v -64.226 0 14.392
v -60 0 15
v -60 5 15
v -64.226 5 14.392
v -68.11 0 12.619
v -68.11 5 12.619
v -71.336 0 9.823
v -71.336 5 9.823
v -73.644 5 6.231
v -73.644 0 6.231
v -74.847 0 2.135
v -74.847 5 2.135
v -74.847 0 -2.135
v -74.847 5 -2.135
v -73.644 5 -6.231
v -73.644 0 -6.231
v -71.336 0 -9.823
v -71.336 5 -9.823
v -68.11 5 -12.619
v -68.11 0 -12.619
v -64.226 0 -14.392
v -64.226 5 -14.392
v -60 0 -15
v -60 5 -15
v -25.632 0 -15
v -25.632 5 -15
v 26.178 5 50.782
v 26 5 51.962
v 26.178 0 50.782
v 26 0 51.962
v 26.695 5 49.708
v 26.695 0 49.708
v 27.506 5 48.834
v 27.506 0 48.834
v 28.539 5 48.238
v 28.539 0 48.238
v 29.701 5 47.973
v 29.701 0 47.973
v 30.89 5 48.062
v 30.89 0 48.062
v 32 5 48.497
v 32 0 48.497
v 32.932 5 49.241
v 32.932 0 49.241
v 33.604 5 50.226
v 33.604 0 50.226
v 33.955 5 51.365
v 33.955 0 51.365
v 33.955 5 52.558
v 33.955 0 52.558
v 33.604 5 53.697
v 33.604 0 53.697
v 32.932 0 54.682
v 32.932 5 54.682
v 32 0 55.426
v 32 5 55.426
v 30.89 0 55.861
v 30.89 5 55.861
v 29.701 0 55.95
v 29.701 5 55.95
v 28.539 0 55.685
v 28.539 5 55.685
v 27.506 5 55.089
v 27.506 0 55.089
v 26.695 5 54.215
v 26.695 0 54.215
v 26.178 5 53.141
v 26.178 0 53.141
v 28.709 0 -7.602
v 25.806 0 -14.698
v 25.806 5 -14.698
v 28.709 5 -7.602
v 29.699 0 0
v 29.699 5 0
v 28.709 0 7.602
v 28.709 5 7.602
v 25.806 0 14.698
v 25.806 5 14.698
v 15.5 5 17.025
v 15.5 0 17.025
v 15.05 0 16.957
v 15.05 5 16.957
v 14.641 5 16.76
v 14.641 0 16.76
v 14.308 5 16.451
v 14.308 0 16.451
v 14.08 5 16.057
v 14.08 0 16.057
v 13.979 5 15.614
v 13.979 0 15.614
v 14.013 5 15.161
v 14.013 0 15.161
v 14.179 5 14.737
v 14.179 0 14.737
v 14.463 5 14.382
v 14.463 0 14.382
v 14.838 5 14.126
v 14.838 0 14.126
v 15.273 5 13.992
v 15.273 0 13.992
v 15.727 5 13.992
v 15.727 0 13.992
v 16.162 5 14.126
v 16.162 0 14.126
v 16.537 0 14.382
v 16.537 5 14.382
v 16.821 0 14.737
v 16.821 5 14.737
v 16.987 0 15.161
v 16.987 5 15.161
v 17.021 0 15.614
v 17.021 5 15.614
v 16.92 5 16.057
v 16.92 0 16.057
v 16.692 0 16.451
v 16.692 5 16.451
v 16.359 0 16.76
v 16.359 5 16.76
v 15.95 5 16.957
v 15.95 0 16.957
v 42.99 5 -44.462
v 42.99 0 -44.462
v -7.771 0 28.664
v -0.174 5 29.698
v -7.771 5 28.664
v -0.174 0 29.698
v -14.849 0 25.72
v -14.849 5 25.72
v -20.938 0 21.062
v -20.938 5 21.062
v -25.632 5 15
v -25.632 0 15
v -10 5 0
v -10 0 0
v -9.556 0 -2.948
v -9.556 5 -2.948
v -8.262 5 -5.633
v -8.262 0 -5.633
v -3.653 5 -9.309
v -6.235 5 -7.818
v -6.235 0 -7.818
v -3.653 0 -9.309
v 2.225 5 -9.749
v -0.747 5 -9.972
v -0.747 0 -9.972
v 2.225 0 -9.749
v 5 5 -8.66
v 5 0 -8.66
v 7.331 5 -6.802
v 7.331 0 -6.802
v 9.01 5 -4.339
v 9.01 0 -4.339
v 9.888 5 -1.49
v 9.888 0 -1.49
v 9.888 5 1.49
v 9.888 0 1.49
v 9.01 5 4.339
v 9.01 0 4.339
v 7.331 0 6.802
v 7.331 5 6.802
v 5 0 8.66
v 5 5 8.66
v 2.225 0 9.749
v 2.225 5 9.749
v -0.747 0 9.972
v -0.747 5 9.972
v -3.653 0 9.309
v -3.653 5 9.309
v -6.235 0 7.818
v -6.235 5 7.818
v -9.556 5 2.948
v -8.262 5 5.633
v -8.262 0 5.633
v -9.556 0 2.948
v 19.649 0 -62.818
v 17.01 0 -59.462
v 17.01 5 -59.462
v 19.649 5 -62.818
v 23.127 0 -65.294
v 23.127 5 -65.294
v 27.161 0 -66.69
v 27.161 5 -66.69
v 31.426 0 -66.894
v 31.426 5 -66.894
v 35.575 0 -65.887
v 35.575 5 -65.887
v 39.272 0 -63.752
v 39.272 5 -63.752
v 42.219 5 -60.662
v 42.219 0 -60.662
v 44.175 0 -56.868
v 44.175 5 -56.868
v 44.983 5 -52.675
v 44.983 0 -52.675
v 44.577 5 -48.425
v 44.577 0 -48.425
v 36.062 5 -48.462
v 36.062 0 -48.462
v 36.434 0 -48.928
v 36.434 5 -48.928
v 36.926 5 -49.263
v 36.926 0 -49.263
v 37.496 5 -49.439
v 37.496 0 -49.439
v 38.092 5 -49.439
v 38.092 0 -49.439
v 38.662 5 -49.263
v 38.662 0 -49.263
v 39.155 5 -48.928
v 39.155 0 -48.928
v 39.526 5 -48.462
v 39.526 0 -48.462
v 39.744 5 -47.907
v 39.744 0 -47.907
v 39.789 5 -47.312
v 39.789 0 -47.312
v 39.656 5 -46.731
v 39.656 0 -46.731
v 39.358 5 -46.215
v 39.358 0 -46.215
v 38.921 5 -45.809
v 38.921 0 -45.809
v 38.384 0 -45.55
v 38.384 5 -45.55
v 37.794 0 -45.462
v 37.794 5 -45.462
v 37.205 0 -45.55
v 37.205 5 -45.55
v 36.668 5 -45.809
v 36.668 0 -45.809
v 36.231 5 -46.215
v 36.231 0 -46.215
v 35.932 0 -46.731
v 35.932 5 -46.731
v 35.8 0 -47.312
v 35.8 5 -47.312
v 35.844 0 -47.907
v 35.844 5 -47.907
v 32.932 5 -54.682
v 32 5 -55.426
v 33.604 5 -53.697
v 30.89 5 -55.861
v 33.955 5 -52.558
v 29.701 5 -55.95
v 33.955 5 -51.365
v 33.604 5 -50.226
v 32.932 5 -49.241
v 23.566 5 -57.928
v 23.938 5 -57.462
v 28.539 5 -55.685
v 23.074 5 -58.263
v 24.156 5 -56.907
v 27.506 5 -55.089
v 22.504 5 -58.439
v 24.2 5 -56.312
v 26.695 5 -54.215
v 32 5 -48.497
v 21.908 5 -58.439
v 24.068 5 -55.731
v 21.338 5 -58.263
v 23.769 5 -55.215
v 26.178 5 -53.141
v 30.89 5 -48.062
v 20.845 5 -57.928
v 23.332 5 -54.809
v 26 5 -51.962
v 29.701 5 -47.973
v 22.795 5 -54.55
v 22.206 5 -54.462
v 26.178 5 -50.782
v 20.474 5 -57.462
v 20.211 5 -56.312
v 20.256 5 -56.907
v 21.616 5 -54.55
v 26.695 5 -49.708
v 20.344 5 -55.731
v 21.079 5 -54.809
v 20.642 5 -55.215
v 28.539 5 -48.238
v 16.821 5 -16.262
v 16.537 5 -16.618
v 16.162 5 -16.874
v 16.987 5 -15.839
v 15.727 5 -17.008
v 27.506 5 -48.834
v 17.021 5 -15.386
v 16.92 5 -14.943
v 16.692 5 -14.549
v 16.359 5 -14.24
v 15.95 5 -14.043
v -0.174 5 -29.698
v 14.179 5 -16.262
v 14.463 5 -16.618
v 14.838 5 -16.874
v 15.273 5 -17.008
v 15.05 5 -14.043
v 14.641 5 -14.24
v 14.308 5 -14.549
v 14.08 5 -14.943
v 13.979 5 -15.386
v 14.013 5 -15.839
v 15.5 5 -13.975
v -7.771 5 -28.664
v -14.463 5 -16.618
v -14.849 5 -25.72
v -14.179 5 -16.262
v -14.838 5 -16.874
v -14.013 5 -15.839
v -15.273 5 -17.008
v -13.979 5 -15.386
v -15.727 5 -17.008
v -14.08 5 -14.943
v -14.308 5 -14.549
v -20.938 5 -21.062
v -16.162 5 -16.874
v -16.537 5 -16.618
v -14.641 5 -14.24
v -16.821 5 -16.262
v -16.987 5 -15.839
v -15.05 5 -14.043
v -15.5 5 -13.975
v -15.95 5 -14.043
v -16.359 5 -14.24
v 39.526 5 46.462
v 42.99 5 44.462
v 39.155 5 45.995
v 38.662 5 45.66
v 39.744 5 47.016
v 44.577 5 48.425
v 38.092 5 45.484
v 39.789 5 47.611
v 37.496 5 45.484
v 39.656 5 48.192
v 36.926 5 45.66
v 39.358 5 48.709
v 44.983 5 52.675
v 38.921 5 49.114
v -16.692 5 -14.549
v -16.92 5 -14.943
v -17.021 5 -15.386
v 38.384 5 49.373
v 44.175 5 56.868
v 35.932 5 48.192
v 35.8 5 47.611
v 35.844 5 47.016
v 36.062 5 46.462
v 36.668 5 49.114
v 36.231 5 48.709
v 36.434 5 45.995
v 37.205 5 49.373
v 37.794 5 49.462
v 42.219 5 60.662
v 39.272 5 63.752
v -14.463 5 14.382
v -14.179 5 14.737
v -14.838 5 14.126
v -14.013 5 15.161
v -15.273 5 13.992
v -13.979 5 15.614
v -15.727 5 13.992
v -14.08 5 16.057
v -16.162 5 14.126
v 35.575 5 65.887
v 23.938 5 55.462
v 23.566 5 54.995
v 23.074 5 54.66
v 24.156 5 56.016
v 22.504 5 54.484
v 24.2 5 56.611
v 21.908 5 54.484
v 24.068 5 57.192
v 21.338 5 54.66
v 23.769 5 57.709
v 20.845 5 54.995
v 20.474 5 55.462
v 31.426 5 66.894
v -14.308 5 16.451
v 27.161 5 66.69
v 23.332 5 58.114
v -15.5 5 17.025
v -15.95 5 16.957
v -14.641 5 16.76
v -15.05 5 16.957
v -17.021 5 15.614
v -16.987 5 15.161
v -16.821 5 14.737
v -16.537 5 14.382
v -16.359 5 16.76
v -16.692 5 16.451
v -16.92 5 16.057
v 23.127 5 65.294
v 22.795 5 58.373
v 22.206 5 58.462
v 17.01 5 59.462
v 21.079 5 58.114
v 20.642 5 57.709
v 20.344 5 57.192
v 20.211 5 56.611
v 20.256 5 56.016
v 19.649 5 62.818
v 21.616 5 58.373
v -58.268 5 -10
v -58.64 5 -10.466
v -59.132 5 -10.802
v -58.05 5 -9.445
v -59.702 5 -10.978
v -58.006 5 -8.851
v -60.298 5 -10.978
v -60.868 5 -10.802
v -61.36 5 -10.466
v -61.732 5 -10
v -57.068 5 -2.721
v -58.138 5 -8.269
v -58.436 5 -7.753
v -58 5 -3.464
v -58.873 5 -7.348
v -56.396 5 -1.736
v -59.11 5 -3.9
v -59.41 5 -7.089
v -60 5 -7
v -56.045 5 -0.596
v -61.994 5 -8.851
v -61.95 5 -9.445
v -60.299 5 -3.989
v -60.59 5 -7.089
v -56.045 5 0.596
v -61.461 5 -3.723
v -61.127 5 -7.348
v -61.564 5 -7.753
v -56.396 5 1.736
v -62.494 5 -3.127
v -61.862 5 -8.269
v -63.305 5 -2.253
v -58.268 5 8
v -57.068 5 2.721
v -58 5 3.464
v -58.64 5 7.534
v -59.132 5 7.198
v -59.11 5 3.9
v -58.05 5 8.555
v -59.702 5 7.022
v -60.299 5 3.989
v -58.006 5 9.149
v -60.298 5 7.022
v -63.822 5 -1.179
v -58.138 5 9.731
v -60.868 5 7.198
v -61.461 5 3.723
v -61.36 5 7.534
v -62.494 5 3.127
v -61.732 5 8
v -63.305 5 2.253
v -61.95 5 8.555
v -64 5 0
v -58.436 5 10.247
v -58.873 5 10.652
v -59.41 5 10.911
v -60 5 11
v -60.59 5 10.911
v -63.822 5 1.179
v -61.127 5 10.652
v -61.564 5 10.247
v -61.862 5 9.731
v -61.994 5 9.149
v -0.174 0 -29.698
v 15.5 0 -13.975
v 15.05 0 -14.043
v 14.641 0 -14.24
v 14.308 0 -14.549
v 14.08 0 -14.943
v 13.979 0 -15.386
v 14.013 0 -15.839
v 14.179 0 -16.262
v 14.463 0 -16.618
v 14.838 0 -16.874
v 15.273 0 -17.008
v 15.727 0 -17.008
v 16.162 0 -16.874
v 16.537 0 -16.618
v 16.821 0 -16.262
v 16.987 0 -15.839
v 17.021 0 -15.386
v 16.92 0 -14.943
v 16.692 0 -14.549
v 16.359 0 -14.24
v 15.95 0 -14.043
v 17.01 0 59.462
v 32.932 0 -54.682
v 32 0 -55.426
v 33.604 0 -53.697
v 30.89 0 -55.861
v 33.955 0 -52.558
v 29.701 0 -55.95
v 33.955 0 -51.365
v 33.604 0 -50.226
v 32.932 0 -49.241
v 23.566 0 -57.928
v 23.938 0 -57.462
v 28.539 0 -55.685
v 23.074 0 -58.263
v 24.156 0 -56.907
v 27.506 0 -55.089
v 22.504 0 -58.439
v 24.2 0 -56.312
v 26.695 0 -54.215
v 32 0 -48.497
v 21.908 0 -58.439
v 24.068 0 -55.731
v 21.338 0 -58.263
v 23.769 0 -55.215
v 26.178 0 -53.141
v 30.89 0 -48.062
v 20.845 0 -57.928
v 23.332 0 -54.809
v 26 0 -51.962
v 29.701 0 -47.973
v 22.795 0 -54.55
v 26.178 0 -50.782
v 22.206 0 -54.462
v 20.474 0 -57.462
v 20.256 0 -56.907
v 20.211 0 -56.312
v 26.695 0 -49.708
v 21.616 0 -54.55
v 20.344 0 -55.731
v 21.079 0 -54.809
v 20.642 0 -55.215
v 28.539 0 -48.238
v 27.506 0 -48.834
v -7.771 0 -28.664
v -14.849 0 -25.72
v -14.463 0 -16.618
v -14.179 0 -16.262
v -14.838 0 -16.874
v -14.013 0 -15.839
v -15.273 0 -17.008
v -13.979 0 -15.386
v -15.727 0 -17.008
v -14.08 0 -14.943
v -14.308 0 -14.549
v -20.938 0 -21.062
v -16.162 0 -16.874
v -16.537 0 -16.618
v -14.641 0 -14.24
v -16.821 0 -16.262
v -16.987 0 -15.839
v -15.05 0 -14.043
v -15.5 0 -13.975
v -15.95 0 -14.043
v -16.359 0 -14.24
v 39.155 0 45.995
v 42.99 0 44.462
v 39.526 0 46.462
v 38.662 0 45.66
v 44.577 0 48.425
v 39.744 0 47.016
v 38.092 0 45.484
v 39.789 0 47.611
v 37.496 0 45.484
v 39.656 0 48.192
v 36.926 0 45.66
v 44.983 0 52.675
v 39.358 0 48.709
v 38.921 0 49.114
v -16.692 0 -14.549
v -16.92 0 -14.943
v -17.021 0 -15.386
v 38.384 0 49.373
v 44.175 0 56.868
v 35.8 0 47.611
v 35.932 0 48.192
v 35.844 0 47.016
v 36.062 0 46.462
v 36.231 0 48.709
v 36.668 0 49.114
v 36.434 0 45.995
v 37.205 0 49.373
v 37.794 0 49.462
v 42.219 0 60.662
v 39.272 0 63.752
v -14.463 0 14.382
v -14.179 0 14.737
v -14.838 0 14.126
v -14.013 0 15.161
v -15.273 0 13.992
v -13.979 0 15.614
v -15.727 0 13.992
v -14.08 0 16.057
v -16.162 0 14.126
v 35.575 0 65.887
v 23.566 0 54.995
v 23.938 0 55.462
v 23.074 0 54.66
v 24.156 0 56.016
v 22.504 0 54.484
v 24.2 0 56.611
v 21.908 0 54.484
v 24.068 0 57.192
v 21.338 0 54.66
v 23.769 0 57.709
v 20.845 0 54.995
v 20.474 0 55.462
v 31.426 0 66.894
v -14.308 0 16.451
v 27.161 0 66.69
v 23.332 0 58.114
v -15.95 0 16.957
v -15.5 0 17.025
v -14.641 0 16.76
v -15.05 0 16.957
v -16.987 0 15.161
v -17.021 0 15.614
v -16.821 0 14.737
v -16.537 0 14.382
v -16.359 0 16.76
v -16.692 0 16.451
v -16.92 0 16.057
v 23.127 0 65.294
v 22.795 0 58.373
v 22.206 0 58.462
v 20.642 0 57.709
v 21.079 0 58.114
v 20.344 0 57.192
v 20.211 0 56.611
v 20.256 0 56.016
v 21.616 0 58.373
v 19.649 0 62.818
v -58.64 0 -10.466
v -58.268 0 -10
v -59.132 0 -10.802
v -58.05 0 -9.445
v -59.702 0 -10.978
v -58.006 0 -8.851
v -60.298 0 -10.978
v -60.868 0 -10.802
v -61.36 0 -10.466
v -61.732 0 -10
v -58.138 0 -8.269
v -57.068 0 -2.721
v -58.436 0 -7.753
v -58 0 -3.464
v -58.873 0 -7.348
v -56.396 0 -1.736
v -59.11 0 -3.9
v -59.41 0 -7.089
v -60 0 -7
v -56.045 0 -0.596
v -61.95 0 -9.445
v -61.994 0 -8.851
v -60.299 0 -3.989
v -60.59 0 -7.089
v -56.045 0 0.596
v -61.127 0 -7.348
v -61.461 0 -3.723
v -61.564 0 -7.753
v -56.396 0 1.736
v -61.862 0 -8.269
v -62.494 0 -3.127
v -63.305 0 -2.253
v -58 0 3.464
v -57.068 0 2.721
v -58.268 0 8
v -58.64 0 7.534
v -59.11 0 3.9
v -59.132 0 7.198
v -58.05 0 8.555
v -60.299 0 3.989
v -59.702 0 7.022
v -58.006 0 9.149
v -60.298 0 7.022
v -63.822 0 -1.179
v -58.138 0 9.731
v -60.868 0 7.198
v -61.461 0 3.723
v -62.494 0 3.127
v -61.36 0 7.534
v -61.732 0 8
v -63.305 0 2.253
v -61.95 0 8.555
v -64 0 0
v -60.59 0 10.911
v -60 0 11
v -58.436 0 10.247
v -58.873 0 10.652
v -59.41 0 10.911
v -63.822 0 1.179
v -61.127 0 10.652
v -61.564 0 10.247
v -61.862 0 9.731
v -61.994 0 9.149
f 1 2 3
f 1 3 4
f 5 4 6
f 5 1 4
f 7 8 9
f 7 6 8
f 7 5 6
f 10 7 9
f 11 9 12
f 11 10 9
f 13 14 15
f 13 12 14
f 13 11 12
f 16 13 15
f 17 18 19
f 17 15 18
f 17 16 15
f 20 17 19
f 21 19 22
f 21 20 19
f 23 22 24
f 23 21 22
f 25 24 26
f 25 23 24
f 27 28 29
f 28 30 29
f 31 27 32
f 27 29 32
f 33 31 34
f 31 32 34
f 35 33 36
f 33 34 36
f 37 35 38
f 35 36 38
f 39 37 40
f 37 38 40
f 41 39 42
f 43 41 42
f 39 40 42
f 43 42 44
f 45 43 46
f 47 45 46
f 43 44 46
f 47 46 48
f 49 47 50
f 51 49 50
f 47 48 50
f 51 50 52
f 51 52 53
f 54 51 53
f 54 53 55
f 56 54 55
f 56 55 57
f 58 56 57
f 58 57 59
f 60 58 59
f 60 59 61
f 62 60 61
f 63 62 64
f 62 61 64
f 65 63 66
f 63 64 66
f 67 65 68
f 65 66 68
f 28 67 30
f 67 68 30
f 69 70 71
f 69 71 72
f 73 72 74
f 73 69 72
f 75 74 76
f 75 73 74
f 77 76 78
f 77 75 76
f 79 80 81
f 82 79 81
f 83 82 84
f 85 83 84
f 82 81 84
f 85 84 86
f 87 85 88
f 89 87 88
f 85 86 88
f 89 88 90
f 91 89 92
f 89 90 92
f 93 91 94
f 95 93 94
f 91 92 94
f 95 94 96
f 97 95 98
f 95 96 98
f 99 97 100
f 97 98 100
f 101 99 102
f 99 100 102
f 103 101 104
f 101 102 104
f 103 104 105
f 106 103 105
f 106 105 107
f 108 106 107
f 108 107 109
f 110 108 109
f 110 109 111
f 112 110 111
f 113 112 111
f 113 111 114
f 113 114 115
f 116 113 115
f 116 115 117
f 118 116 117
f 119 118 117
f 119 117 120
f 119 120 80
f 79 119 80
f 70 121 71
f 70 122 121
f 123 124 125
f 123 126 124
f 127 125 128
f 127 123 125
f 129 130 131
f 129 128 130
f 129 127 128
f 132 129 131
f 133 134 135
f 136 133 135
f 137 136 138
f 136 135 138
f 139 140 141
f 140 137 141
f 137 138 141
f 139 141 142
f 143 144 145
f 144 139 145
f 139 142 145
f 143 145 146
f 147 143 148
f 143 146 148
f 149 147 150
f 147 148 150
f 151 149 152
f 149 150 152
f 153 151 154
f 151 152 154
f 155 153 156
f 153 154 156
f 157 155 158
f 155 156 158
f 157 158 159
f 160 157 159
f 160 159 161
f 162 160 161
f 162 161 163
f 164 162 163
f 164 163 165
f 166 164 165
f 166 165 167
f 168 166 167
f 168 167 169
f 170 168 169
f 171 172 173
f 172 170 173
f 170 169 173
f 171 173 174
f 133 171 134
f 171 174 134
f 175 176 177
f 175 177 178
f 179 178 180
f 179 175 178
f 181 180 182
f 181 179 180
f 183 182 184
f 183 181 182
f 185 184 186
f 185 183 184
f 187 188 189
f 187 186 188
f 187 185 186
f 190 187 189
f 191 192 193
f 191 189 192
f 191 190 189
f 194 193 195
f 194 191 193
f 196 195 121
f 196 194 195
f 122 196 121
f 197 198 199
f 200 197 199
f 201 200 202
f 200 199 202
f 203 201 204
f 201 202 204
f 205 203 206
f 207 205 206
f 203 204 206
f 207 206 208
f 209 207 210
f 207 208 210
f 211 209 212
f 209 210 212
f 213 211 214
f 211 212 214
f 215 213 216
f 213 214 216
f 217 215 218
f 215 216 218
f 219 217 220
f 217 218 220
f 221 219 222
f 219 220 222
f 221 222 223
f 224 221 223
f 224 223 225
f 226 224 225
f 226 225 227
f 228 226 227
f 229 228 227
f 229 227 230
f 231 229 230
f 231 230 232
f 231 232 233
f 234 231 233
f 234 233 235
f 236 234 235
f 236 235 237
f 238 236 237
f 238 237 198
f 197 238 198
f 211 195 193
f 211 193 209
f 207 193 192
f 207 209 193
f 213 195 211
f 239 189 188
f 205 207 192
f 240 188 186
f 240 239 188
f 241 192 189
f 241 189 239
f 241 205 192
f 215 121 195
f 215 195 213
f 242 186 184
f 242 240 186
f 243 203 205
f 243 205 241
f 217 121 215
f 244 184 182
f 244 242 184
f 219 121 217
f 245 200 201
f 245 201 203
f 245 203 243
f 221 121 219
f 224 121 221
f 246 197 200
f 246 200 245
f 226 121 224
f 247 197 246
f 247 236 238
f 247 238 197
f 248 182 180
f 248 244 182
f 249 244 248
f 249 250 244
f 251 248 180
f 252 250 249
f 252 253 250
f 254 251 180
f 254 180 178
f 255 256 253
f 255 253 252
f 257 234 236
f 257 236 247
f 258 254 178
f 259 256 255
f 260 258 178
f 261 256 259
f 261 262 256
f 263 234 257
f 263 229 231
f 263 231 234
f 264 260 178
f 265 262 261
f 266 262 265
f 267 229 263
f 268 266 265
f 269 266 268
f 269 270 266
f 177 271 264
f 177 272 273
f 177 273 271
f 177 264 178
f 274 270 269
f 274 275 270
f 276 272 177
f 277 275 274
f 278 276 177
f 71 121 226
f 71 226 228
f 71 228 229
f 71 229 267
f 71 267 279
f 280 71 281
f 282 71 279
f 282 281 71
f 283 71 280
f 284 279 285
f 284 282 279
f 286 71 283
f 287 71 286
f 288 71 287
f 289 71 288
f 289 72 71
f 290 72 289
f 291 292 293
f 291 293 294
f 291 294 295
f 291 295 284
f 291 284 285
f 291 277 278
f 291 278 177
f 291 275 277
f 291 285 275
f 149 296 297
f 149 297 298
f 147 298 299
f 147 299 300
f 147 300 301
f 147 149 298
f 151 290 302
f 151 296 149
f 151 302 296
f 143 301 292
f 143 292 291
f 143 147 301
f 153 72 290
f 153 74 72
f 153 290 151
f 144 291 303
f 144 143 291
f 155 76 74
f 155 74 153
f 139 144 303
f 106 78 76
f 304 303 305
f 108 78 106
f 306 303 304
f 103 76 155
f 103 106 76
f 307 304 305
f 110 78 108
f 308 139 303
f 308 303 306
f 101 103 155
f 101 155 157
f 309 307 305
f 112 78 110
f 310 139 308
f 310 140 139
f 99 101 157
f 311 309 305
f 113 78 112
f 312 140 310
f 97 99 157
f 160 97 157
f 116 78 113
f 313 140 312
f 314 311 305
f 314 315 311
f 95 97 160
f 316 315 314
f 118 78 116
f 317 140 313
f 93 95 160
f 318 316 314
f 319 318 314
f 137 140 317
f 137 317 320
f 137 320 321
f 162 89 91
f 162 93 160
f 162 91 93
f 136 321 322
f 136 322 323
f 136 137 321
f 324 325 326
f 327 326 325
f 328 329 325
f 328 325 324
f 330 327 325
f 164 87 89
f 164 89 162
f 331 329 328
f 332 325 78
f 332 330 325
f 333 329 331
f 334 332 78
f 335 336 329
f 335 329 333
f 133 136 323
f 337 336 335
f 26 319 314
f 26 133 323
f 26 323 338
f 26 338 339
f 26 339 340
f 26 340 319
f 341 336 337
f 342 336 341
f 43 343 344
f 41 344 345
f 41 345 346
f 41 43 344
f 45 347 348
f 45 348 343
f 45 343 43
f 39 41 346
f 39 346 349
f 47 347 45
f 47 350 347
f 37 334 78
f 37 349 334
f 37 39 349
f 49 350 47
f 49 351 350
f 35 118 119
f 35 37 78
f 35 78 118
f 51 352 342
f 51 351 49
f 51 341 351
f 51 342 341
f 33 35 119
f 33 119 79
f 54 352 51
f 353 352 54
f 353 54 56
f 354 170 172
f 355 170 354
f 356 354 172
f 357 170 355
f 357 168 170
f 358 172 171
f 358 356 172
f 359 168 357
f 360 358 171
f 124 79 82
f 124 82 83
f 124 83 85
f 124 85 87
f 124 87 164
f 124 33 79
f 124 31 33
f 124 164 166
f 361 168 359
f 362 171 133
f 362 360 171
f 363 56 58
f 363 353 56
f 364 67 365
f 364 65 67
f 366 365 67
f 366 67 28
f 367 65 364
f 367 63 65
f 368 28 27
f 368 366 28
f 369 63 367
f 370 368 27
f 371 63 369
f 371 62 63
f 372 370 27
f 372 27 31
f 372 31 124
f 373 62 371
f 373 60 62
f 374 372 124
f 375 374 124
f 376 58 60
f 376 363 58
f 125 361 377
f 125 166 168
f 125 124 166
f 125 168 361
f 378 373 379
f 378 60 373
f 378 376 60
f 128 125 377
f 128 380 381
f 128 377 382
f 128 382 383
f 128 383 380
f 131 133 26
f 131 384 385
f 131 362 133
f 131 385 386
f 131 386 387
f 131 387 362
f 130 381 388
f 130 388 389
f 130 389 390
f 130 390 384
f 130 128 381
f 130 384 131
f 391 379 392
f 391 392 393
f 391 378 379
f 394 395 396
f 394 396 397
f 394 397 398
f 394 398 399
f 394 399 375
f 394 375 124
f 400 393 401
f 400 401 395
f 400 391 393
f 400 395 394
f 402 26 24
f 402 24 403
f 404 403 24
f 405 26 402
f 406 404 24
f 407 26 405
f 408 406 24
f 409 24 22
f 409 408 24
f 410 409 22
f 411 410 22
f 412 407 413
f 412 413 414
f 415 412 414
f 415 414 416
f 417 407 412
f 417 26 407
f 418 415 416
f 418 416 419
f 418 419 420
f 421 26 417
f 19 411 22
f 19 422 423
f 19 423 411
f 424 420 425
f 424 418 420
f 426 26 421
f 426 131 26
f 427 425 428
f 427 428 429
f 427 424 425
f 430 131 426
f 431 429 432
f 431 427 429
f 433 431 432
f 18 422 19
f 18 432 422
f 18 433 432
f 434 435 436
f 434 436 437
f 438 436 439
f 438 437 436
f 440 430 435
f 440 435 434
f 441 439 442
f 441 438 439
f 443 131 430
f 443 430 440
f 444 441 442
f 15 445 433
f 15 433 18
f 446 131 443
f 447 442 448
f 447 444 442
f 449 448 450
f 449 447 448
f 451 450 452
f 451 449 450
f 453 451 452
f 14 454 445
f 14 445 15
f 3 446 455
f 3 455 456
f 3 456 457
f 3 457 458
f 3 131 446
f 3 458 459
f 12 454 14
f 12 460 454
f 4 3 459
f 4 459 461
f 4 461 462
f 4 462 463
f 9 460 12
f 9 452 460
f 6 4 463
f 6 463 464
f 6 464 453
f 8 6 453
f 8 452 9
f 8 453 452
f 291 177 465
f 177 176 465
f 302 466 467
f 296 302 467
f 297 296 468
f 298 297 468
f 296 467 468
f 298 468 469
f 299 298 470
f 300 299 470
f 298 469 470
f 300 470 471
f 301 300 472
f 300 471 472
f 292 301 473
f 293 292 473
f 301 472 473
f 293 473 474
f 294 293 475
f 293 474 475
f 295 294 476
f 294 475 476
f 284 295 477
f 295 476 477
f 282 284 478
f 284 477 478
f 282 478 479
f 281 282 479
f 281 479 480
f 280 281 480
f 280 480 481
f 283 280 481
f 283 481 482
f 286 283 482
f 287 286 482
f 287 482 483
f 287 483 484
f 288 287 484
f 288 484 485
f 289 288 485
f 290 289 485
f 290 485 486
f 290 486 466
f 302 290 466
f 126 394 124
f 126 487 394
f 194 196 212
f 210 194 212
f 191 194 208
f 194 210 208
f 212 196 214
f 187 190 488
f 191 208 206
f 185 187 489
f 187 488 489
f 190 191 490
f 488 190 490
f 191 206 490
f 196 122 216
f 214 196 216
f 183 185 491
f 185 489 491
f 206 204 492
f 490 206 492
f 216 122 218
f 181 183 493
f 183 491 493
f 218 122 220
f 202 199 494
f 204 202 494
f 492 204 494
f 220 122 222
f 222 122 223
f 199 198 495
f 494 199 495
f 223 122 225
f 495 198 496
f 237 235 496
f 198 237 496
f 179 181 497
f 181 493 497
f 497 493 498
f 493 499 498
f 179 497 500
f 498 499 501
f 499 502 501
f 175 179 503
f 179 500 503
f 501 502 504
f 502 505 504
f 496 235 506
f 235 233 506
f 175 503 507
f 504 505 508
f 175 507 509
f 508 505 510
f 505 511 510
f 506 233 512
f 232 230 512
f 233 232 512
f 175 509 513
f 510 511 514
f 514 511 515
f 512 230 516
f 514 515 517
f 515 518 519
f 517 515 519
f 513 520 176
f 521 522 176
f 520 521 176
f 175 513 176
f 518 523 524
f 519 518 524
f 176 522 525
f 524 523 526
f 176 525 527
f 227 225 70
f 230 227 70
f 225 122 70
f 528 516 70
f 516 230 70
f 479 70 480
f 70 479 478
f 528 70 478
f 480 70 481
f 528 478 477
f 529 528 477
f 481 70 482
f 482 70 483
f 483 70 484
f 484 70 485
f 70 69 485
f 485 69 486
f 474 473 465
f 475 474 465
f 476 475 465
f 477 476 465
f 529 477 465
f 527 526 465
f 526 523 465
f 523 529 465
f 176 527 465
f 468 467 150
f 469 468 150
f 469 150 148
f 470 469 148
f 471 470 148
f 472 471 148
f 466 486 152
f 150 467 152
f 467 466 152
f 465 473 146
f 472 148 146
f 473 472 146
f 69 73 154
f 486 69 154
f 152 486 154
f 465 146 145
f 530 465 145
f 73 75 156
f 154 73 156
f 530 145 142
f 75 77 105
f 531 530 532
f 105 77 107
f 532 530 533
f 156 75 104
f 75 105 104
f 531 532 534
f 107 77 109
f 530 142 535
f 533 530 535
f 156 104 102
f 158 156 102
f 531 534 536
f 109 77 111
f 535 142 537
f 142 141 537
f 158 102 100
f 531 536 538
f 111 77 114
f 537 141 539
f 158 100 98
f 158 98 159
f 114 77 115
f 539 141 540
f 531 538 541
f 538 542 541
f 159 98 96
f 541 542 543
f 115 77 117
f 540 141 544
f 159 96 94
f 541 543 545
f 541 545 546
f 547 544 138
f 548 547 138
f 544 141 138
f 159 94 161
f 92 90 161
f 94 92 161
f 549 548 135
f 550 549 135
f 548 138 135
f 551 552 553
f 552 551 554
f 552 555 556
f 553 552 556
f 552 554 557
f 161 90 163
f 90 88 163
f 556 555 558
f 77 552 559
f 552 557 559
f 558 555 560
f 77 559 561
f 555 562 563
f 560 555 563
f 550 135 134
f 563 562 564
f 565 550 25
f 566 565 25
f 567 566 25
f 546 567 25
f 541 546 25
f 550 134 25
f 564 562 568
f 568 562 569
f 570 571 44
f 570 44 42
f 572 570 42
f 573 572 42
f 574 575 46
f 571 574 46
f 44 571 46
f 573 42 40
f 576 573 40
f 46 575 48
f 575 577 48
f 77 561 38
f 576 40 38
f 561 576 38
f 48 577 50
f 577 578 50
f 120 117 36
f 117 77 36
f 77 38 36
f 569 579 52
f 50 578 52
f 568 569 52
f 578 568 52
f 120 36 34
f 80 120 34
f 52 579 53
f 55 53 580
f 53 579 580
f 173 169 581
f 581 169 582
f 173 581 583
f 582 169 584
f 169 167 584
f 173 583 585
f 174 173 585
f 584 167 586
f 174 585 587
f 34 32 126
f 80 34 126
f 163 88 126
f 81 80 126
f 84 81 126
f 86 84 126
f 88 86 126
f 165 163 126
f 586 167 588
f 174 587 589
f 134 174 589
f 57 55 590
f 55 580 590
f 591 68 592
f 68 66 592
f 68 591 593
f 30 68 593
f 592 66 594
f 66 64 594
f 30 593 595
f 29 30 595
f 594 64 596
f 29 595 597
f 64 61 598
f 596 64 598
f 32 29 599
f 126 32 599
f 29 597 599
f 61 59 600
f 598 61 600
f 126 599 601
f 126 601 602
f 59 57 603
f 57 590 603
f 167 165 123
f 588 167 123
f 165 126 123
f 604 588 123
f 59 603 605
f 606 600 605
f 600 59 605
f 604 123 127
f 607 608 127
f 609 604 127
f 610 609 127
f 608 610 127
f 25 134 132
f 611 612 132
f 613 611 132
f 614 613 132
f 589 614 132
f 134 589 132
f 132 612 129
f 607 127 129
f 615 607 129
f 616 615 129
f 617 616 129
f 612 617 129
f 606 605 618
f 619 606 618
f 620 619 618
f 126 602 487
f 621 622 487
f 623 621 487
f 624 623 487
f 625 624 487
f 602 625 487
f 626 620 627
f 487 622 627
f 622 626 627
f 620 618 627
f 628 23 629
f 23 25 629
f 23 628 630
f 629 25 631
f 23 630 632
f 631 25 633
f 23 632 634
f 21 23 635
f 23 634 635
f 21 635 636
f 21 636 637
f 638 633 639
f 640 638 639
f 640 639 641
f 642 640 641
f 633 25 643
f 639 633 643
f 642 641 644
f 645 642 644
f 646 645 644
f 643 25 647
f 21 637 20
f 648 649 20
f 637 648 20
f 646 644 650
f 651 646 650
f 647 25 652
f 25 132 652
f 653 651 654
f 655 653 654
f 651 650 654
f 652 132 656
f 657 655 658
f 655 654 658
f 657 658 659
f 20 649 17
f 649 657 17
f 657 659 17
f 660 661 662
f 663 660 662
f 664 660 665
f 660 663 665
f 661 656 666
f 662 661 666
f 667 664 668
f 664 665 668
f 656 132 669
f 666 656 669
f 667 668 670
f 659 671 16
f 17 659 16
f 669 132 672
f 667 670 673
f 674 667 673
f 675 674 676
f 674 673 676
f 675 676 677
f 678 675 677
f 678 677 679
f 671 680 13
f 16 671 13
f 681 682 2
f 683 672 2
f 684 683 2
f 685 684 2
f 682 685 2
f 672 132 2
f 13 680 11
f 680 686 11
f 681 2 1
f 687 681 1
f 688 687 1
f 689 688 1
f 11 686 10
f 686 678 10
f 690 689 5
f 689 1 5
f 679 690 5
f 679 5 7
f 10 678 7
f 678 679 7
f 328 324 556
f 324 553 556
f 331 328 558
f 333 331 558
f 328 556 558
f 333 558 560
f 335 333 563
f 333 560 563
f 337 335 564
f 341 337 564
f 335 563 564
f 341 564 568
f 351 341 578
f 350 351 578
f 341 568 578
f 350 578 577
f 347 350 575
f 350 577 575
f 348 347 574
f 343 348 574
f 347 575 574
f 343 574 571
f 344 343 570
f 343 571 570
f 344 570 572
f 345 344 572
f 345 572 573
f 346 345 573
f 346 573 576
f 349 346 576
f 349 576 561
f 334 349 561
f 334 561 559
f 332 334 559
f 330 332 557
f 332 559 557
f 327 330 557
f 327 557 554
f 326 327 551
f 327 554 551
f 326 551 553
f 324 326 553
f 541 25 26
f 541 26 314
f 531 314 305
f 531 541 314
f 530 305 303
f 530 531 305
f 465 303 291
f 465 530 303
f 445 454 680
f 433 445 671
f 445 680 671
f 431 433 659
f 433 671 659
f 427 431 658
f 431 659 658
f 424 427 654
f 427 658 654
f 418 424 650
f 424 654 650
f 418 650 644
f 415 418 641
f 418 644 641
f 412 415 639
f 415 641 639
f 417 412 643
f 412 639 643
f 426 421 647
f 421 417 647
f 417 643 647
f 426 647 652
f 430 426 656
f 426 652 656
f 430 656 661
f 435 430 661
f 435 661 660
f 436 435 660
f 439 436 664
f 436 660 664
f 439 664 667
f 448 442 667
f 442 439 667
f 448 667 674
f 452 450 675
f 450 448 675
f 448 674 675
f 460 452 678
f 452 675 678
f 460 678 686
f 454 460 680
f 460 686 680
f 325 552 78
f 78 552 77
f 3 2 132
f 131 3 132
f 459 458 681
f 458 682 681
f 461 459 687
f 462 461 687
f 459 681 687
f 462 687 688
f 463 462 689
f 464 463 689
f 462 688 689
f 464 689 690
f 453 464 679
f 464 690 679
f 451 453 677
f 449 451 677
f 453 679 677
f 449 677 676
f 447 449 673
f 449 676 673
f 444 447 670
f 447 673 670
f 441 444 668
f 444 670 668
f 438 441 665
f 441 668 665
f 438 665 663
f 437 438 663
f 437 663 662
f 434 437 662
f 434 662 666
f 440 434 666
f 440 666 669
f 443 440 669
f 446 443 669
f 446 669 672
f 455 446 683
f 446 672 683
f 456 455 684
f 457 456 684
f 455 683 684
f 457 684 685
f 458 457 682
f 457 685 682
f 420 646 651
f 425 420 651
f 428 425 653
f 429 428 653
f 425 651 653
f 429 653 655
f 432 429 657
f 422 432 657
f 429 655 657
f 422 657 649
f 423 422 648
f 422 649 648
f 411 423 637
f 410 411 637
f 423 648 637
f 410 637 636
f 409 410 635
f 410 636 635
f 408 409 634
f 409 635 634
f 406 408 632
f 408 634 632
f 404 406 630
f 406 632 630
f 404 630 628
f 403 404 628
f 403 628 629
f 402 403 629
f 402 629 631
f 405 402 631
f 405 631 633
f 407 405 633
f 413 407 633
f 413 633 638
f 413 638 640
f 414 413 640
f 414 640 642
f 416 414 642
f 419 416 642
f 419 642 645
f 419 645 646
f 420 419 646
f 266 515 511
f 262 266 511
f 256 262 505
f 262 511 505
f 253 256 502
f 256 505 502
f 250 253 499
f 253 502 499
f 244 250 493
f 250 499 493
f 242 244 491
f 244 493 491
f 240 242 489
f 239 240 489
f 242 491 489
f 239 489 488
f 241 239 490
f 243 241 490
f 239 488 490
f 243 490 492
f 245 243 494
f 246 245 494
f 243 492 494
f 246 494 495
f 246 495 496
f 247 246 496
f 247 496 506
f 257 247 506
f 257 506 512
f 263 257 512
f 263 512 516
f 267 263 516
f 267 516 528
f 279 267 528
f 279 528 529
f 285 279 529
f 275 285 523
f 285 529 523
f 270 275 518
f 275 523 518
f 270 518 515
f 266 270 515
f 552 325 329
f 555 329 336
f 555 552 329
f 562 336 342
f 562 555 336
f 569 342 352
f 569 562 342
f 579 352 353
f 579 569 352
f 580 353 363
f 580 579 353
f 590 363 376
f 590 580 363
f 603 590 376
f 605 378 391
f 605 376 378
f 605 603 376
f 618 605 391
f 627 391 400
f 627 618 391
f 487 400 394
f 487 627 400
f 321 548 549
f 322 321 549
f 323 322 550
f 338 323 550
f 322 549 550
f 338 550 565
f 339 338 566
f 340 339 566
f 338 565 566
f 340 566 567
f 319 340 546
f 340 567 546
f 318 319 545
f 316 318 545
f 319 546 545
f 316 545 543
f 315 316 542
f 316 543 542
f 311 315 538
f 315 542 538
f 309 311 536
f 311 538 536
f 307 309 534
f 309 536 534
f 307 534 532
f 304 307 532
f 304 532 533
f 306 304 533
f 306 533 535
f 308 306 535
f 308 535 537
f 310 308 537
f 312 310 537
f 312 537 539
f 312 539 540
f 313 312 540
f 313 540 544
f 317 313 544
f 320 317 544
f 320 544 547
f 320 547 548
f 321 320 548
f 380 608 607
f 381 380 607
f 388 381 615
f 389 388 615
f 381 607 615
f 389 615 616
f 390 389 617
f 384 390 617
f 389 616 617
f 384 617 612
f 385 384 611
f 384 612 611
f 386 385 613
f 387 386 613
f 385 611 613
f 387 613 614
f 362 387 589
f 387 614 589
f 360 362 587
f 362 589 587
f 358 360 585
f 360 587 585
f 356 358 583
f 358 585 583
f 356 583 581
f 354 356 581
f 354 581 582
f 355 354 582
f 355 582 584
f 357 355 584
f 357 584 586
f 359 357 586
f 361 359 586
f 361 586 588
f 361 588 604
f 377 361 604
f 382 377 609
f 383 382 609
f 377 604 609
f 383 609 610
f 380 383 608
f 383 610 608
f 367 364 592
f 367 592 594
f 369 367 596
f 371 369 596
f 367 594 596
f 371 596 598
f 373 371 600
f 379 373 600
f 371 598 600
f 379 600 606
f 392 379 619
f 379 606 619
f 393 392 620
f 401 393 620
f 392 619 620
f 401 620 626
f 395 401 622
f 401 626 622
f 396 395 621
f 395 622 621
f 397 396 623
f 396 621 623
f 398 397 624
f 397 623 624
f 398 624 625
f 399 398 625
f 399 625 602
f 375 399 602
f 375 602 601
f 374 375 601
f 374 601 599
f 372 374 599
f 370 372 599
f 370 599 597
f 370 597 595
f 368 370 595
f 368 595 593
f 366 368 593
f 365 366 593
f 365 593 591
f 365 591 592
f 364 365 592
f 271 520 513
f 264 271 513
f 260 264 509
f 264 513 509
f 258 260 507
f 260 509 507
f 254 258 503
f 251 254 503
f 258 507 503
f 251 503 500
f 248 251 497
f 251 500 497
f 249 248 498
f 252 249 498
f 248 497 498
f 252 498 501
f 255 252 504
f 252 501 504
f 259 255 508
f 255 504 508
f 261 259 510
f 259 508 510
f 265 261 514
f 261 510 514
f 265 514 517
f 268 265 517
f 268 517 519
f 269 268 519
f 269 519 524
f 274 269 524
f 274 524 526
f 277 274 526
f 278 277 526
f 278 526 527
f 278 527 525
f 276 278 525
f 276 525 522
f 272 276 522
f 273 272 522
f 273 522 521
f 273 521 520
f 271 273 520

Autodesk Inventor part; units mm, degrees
ref_plane "YZ Plane" through (0, 0, 0) normal (1, 0, 0) x (0, 1, 0)
ref_plane "XZ Plane" through (0, 0, 0) normal (0, 1, 0) x (-1, 0, 0)
ref_plane "XY Plane" through (0, 0, 0) normal (0, 0, 1) x (1, 0, 0)
sketch "Sketch1" plane through (0, 0, 0) normal (0, 1, 0) x (-1, 0, 0)
  circle A0 centre (0, 0) radius 60
  circle A1 centre (60, 0) radius 4
  circle A2 centre (-30, 51.9615) radius 4
  circle A3 centre (-30, -51.9615) radius 4
  circle A4 centre (-30, 51.9615) radius 15
  circle A5 centre (-30, -51.9615) radius 15
  circle A6 centre (60, 0) radius 15
  line L0 (21, -21) -> (-21, -21)
  line L1 (-21, -21) -> (-21, 21)
  line L2 (-21, 21) -> (21, 21)
  line L3 (21, 21) -> (21, -21)
  line L4 (21, -21) -> (-21, 21) construction
  line L5 (-21, -21) -> (21, 21) construction
  line L6 (67.5, 12.9904) -> (-22.5, 64.9519)
  line L7 (67.5, -12.9904) -> (-22.5, -64.9519)
  line L8 (-45, 51.9615) -> (-45, -51.9615)
  circle A7 centre (0, 0) radius 10
  line L9 (67.5, 12.9904) -> (21, 39.8372)
  line L10 (60, 15) -> (25.632, 15)
  line L11 (60, -15) -> (25.632, -15)
  circle A8 centre (0, 0) radius 29.6985
  circle A9 centre (28.3546, 20) radius 5
  circle A10 centre (28.3546, -20) radius 5
  circle A11 centre (-31.4978, 14.5558) radius 5
  line L12 (-42.9904, 44.4615) -> (-25.8064, 14.698)
  line L13 (-17.0096, 59.4615) -> (0.1744, 29.698)
  circle A12 centre (3.1432, 34.5558) radius 5
  circle A13 centre (3.1432, -34.5558) radius 5
  line L14 (-17.0096, -59.4615) -> (0.1744, -29.698)
  line L15 (-42.9904, -44.4615) -> (-25.8064, -14.698)
  circle A14 centre (-31.4978, -14.5558) radius 5
  point P0 (16, -16)
  point P1 (16, 16)
  point P2 (-16, 16)
  point P3 (-16, -16)
  point P4 (-16.174, 57.7789)
  point P5 (-41.951, 42.8966)
  point P6 (-42.0378, 42.8115)
  point P7 (-25.8064, 14.698)
  point P8 (-25.8064, -14.698)
  point P9 (-42.0378, -42.8115)
  point P10 (-41.951, -42.8966)
  point P11 (-16.174, -57.7789)
  point P12 (-16.057, -57.8115)
  point P13 (58.0948, -15)
  point P14 (58.125, -14.8824)
  point P15 (58.125, 14.8824)
  point P16 (58.0948, 15)
  point P17 (-16.057, 57.8115)
  dimension "d0" = 120
  dimension "d2" = 8
  dimension "d5" = 360
  dimension "d7" = 30
  dimension "d8" = 30
  dimension "d9" = 30
  dimension "d10" = 42
  dimension "d11" = 42
  dimension "d12" = 20
  dimension "d13" = 32
  dimension "d14" = 16
  dimension "d15" = 16
  dimension "d16" = 32
  dimension "d17" = 10
  dimension "d18" = 10
  dimension "d21" = 360
extrude "Extrusion1" add sketch "Sketch1" along normal blind 5 contours A1 A0 A6 | A0 A6 A1 | A6 A0 L11 A8 L10 | A0 L10 A6 | A6 L11 A0 | A8 L3 | L13 A8 L12 A0 A4 | A0 A4 L13 | A4 A0 A2 | L3 L0 L1 L2 | L2 A8 | L14 A5 A0 | A0 A5 L15 A8 L14 | A5 A0 A3 | A8 L0 | A4 A0 A2 | L1 A8 | A0 A3 A5 | A4 A0 L12 | L15 A0 A5
sketch "Sketch2" plane through (0, 5, 0) normal (0, 1, 0) x (1, 0, 0)
  point P0 (0, 0)
  point P1 (-15.5, -15.5)
  point P2 (-15.5, 15.5)
  point P3 (15.5, -15.5)
  point P4 (15.5, 15.5)
  dimension "d25" = 31
  dimension "d26" = 31
  dimension "d27" = 15.5
  dimension "d28" = 15.5
hole "Hole1" at (-15.5, 5, 15.5) at (-15.5, 5, -15.5) at (15.5, 5, 15.5) at (15.5, 5, -15.5) direction (0, -1, 0) diameter 3.05 end through all
sketch "Sketch3" plane through (0, 5, 0) normal (0, 1, 0) x (1, 0, 0)
  circle A0 centre (-60, 0) radius 4 projected
  point P0 (0, 0)
  point P1 (-60, -9)
  point P2 (-60, 9)
  dimension "d36" = 9
  dimension "d37" = 18
hole "Hole2" at (-60, 5, 9) at (-60, 5, -9) direction (0, -1, 0) diameter 4 end through all
pattern_circular "Circular Pattern1" count 3 over 360 about axis through (0, 0, 0) along (0, 1, 0) of "Hole2"
properties part number "De_Duoi" material "Aluminum 6061"
